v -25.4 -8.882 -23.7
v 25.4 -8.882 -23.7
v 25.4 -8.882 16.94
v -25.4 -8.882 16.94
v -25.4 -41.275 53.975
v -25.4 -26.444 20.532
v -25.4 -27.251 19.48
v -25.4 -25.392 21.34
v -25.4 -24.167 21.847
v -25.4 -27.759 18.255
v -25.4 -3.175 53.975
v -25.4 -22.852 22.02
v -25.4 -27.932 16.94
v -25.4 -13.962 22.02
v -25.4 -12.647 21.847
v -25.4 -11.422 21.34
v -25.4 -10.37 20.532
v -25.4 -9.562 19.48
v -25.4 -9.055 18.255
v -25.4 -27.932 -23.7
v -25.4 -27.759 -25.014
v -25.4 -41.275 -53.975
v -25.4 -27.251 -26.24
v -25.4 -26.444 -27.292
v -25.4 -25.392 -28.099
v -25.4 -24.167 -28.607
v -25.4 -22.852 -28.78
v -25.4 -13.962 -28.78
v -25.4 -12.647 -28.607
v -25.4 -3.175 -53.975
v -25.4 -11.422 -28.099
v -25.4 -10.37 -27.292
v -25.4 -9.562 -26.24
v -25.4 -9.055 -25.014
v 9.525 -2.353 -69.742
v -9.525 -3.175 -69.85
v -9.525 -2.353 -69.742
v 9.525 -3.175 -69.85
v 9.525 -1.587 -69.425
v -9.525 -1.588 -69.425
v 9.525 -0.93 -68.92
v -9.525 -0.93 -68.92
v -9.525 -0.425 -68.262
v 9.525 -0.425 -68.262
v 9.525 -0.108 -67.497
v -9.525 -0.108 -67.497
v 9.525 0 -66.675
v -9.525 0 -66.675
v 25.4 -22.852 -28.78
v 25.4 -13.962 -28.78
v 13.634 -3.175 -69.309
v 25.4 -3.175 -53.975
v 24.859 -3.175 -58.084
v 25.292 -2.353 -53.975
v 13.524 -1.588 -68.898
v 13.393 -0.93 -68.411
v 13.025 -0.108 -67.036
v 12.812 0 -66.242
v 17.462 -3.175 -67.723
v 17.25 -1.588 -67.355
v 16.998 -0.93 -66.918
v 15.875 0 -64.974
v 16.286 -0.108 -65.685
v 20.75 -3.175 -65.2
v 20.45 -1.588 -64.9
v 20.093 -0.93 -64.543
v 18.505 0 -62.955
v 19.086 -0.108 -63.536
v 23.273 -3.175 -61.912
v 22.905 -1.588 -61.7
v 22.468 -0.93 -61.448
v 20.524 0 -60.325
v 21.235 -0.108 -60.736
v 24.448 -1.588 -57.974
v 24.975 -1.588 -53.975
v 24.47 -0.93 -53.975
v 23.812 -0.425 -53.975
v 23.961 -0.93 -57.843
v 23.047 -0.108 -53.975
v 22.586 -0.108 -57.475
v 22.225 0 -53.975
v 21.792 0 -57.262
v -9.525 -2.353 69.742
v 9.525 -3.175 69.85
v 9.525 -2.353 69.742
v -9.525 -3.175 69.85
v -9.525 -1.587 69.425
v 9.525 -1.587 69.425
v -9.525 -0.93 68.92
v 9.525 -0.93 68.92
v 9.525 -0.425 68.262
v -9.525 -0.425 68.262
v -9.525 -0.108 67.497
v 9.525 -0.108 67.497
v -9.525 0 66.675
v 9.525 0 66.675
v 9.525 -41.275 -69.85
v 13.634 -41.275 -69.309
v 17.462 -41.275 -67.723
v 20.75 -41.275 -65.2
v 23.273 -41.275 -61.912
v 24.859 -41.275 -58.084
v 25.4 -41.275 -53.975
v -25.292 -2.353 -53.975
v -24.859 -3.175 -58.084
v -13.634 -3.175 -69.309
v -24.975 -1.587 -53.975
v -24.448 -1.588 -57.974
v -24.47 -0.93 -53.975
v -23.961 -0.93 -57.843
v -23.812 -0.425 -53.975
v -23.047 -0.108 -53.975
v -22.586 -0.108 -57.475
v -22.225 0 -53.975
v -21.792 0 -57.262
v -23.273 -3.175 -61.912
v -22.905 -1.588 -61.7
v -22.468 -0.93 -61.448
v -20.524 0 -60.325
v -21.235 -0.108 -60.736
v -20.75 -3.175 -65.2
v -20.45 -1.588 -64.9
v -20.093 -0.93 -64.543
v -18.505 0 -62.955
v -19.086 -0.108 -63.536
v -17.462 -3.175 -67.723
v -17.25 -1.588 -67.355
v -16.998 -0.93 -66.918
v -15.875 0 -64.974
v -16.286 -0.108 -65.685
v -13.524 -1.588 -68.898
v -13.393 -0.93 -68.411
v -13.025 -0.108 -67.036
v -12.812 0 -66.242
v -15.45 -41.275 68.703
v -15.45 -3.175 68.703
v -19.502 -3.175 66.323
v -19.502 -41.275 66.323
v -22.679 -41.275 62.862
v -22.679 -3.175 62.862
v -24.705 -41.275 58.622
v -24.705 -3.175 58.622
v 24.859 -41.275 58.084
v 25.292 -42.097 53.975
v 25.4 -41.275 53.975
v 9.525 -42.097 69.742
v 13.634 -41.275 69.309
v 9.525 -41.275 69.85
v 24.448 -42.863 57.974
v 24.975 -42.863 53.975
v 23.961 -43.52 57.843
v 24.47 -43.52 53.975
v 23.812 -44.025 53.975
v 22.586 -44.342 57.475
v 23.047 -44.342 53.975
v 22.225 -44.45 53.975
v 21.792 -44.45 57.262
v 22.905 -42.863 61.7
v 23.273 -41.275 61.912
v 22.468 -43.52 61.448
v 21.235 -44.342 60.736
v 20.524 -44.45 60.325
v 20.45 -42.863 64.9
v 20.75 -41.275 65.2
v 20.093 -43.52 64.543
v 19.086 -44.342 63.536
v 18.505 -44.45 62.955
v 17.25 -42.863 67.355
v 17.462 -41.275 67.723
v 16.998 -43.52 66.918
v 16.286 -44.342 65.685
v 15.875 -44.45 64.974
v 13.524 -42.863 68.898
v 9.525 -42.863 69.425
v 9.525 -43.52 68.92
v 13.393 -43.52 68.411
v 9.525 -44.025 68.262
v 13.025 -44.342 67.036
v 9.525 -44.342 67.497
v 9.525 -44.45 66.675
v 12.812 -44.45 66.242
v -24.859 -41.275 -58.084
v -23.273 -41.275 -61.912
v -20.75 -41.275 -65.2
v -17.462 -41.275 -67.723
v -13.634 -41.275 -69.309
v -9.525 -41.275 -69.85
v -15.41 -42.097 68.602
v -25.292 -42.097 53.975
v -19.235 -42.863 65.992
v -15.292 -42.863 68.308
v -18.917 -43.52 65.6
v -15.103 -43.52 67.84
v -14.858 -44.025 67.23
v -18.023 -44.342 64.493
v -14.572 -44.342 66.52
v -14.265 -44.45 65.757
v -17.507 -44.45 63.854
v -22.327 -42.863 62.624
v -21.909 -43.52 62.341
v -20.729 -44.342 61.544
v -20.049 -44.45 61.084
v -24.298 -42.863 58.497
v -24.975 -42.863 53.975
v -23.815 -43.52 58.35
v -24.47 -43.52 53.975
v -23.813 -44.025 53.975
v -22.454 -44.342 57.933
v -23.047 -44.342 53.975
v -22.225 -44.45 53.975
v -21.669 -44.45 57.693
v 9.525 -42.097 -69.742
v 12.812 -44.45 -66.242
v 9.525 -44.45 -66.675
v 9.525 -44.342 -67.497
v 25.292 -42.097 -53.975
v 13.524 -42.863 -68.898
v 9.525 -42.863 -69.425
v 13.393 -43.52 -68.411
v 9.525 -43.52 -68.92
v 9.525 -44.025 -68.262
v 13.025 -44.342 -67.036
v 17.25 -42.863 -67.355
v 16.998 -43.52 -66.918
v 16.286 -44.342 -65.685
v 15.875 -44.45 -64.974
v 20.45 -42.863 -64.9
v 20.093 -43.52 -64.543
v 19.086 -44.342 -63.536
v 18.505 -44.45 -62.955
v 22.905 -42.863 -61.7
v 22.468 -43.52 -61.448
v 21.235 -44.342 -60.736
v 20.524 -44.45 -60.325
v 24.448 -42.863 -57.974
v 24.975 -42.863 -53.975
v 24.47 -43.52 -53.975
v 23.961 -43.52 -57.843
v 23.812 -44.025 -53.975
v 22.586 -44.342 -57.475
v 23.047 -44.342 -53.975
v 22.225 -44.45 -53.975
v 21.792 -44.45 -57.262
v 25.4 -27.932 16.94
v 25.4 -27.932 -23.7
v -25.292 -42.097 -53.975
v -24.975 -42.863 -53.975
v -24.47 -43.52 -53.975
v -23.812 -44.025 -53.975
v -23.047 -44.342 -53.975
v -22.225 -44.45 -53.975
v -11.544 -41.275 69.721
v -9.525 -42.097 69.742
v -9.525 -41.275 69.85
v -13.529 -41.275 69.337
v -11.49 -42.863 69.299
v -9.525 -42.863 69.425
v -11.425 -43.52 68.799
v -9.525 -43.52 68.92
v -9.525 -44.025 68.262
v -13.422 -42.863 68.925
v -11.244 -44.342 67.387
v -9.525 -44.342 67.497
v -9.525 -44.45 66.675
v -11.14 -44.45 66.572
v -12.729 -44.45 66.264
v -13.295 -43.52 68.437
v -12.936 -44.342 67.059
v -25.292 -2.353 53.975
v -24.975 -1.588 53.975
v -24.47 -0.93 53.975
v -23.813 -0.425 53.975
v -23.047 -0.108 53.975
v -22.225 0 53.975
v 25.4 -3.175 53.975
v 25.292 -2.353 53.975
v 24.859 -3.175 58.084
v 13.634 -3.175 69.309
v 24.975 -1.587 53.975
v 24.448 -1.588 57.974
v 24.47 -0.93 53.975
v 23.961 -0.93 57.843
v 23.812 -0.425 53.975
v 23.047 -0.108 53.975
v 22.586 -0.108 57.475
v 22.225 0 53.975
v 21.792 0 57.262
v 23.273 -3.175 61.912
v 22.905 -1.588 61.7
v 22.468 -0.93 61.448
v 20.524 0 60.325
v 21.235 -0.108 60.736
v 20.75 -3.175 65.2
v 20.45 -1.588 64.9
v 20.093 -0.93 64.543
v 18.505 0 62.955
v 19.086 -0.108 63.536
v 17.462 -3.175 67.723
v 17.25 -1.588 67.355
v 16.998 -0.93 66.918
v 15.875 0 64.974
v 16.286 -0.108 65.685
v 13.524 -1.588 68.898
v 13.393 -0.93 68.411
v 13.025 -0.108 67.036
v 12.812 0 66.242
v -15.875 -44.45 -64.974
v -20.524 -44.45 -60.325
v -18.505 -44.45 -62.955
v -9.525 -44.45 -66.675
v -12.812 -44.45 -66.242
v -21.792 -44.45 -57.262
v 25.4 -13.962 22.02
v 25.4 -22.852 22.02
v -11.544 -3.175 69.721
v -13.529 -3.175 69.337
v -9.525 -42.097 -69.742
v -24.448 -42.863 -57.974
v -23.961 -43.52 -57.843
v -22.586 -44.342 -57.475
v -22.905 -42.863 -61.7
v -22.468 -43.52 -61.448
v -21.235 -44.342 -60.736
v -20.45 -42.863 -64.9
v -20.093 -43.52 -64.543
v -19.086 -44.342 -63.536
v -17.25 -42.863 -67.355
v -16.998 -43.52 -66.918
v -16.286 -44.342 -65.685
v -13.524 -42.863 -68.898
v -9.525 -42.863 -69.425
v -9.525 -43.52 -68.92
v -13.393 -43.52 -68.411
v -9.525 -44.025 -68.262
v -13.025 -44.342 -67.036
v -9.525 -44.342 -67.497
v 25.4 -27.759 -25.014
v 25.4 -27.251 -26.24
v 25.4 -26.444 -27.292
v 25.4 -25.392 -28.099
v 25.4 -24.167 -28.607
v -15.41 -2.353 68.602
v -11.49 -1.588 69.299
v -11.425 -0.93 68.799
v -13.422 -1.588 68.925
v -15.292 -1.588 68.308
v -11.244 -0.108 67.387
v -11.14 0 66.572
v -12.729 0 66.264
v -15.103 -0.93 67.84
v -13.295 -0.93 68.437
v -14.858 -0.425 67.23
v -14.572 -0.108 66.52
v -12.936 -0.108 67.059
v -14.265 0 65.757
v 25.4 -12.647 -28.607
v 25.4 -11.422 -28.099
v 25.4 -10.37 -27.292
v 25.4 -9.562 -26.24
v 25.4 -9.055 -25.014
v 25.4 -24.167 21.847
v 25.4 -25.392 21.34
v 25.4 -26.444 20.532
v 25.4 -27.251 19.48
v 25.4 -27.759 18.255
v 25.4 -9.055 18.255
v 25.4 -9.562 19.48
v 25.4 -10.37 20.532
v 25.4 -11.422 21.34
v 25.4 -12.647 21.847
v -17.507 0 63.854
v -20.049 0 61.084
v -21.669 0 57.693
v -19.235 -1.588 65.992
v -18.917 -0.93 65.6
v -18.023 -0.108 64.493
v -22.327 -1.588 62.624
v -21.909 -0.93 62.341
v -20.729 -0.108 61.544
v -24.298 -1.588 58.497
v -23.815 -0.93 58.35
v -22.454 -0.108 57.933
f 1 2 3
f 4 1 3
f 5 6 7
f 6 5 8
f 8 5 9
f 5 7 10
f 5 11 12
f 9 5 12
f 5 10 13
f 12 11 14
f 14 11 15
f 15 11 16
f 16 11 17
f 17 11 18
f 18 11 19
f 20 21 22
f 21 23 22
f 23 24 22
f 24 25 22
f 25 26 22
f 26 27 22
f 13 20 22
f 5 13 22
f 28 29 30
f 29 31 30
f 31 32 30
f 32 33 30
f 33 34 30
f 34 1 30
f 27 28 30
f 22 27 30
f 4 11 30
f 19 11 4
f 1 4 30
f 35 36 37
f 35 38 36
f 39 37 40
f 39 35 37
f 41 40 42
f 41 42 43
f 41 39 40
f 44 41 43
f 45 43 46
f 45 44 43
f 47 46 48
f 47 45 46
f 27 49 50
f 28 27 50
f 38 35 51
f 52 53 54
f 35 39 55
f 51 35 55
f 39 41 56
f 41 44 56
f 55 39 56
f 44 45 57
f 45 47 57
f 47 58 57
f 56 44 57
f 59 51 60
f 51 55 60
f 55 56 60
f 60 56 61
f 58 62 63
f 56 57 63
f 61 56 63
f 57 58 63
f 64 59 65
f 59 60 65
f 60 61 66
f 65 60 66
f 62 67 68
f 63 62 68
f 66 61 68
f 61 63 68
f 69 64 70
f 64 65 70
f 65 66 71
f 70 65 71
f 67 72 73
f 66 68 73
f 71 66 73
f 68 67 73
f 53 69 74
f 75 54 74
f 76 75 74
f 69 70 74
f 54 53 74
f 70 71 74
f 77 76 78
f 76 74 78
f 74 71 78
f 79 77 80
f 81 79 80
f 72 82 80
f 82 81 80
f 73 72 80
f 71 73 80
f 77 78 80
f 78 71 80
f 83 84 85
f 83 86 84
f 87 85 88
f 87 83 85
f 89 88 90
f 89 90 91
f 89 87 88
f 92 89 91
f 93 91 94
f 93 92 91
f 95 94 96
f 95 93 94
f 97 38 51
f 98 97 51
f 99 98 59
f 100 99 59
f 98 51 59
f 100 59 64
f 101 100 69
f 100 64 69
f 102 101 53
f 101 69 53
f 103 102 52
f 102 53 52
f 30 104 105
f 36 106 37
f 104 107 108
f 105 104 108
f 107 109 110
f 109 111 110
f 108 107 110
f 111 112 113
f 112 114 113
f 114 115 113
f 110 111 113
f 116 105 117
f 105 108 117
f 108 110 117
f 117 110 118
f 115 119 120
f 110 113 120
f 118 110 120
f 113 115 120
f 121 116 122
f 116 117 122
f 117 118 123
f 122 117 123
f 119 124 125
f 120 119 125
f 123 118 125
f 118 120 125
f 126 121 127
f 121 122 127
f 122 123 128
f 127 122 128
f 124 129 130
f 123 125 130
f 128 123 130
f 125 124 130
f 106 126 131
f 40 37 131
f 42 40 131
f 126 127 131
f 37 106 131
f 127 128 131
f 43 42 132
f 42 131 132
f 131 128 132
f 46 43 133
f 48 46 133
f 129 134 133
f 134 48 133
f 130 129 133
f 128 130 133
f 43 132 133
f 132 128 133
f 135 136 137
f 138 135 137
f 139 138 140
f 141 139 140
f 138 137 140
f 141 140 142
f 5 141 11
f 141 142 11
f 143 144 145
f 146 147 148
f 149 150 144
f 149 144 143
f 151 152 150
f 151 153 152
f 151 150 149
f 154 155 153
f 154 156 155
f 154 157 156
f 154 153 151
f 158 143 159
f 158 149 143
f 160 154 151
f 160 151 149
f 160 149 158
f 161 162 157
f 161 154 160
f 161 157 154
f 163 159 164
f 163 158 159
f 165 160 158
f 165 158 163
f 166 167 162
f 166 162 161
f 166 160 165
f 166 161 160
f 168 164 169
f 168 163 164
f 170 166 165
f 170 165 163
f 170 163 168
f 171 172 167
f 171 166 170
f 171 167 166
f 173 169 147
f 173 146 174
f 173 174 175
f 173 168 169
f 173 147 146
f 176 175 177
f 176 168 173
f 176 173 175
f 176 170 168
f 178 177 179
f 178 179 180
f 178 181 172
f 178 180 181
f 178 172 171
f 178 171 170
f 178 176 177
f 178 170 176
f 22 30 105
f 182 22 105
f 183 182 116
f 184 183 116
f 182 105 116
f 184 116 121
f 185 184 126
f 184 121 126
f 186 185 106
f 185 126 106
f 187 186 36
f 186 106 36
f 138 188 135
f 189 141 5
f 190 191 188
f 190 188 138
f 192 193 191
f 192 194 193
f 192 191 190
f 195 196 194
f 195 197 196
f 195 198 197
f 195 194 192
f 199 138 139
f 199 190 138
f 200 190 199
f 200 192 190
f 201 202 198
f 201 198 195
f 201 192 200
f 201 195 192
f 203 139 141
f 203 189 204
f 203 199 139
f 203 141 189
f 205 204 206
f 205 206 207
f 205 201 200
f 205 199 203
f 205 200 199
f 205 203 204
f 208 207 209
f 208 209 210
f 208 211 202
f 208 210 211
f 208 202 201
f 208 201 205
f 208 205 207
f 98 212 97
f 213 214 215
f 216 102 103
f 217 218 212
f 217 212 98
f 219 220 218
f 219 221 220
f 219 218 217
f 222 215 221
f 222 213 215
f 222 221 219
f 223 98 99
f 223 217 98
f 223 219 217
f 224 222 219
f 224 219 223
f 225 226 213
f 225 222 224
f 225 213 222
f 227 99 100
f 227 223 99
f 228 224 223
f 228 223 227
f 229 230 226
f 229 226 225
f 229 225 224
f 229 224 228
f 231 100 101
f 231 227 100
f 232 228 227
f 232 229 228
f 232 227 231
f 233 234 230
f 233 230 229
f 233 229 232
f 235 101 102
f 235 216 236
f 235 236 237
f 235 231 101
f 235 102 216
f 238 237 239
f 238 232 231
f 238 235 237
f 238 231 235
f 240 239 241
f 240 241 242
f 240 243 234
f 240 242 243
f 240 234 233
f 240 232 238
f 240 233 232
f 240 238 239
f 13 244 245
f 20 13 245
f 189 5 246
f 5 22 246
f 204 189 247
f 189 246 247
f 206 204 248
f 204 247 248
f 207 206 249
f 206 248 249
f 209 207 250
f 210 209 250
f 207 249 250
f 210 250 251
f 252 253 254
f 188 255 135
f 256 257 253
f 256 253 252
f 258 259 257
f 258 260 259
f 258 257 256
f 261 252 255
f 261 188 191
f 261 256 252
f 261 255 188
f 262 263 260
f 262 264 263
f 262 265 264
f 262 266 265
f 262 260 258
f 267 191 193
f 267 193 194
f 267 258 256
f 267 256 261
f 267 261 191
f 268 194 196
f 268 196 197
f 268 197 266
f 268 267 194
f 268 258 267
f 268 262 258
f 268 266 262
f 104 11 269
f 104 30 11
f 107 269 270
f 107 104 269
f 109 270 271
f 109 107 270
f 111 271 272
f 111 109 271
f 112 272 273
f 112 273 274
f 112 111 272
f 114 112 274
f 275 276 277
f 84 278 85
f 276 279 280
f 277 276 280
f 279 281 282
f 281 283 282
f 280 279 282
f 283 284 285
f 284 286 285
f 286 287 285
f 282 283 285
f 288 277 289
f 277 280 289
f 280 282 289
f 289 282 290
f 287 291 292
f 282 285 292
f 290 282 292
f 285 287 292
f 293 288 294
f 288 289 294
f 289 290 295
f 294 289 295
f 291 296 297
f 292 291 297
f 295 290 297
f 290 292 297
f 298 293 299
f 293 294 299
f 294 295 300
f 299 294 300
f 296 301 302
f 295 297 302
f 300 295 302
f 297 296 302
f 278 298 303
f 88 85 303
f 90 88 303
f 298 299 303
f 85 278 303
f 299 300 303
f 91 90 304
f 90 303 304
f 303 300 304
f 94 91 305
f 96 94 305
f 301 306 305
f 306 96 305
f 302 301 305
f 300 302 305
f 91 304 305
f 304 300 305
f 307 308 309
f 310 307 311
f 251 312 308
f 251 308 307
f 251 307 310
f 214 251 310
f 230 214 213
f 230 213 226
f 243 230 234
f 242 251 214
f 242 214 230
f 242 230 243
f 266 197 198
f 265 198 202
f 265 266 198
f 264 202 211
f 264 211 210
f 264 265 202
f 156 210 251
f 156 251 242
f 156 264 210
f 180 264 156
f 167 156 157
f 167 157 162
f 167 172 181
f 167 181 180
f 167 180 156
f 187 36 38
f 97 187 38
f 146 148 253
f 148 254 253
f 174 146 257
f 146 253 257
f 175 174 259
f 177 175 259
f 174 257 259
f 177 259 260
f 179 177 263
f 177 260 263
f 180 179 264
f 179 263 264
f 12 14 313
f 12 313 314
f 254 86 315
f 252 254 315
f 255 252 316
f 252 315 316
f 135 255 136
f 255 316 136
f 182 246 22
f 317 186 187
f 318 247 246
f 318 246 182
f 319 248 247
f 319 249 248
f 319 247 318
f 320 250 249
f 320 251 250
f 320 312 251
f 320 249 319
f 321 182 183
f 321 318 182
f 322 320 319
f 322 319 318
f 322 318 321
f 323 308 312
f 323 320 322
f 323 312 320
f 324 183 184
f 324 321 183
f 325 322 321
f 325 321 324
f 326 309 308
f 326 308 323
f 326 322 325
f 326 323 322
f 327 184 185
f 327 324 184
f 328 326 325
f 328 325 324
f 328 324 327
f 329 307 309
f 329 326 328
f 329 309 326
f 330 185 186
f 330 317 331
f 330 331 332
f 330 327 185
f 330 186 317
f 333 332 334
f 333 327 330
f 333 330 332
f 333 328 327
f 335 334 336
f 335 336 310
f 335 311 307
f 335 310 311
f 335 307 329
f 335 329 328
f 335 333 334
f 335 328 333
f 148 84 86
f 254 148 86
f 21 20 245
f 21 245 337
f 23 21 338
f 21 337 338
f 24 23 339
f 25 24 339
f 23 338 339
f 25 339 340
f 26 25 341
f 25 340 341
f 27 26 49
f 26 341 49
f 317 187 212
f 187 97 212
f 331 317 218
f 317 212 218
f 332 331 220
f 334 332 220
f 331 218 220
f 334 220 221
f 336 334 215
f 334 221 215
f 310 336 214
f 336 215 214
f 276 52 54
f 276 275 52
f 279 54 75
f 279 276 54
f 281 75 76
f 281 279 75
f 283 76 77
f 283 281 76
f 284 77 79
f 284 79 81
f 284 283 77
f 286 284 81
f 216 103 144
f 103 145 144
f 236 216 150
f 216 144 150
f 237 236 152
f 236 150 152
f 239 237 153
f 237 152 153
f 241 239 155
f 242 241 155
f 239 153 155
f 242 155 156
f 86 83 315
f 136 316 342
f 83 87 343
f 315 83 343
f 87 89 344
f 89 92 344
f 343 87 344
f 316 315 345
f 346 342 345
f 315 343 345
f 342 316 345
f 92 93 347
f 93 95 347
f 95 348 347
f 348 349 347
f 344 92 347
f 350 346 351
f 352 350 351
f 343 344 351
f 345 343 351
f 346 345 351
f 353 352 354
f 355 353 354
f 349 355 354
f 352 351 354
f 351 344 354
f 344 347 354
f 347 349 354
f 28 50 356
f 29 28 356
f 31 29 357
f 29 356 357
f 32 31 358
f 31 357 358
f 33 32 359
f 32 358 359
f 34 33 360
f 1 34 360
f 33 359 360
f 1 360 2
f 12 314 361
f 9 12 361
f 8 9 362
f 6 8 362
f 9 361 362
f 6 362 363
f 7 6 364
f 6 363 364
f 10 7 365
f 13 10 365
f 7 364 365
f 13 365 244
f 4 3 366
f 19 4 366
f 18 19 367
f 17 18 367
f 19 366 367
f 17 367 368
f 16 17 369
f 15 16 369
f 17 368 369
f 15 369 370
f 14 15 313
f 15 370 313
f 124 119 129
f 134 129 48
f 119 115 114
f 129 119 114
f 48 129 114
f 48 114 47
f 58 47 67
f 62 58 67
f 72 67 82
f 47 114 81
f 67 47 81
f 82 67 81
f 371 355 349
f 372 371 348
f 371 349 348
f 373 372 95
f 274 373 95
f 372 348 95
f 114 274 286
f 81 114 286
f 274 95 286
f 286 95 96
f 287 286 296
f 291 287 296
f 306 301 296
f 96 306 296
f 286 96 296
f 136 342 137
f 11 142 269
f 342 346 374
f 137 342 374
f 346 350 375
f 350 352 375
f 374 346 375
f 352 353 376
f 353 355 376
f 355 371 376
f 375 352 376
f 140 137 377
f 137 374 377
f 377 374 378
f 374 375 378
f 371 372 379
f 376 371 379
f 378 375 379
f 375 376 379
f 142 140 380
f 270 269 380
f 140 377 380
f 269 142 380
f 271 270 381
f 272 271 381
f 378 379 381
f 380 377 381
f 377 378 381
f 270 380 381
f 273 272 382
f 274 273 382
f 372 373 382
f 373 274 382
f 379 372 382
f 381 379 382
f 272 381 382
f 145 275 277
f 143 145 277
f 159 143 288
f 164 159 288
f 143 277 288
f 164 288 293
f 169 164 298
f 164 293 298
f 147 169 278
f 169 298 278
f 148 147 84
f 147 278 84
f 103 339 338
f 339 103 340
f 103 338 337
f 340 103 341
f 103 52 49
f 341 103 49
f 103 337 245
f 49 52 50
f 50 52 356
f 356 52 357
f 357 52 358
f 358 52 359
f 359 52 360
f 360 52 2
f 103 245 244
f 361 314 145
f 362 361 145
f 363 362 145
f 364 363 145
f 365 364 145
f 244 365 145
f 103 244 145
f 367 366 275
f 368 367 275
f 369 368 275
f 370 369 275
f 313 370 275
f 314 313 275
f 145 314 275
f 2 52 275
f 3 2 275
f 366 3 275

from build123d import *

# Parameters (mm, degrees)
F1_DEPTH = 44.45
F3_DEPTH = 50.801
F4_R     = 3.175


with BuildPart() as f1:
    # F0 (on Front) → F1 (new body)
    with BuildSketch(Plane.XZ):
        with BuildLine():
            ThreePointArc((25.4, 53.975), (20.75032, 65.20032), (9.525, 69.85))
            Line((9.525, 69.85), (-9.525, 69.85))
            ThreePointArc((-9.525, 69.85), (-12.542667, 69.560548), (-15.45029, 68.702748))
            ThreePointArc((-15.45029, 68.702748), (-22.679459, 62.861834), (-25.4, 53.975))
            Line((-25.4, 53.975), (-25.4, -53.975))
            ThreePointArc((-25.4, -53.975), (-20.75032, -65.20032), (-9.525, -69.85))
            Line((-9.525, -69.85), (9.525, -69.85))
            ThreePointArc((9.525, -69.85), (20.75032, -65.20032), (25.4, -53.975))
            Line((25.4, -53.975), (25.4, 53.975))
        make_face()
    extrude(amount=F1_DEPTH)

    # F2 (on face) → F3 (cut, through all)
    with BuildSketch(Plane.YZ.offset(25.4)):
        with BuildLine():
            Line((-13.961844, 22.020357), (-22.851844, 22.020357))
            ThreePointArc((-22.851844, 22.020357), (-26.443946, 20.53246), (-27.931844, 16.940357))
            Line((-27.931844, 16.940357), (-27.931844, -23.699643))
            ThreePointArc((-27.931844, -23.699643), (-26.443946, -27.291745), (-22.851844, -28.779643))
            Line((-22.851844, -28.779643), (-13.961844, -28.779643))
            ThreePointArc((-13.961844, -28.779643), (-10.369742, -27.291745), (-8.881844, -23.699643))
            Line((-8.881844, -23.699643), (-8.881844, 16.940357))
            ThreePointArc((-8.881844, 16.940357), (-10.369742, 20.53246), (-13.961844, 22.020357))
        make_face()
    extrude(amount=-F3_DEPTH, mode=Mode.SUBTRACT)

    # F4
    f4_edges = [f1.edges().sort_by_distance(p)[0] for p in [
        (0, -44.45, 69.85),
        (0, 0, 69.85),
    ]]
    fillet(f4_edges, radius=F4_R)


solid = f1.part
